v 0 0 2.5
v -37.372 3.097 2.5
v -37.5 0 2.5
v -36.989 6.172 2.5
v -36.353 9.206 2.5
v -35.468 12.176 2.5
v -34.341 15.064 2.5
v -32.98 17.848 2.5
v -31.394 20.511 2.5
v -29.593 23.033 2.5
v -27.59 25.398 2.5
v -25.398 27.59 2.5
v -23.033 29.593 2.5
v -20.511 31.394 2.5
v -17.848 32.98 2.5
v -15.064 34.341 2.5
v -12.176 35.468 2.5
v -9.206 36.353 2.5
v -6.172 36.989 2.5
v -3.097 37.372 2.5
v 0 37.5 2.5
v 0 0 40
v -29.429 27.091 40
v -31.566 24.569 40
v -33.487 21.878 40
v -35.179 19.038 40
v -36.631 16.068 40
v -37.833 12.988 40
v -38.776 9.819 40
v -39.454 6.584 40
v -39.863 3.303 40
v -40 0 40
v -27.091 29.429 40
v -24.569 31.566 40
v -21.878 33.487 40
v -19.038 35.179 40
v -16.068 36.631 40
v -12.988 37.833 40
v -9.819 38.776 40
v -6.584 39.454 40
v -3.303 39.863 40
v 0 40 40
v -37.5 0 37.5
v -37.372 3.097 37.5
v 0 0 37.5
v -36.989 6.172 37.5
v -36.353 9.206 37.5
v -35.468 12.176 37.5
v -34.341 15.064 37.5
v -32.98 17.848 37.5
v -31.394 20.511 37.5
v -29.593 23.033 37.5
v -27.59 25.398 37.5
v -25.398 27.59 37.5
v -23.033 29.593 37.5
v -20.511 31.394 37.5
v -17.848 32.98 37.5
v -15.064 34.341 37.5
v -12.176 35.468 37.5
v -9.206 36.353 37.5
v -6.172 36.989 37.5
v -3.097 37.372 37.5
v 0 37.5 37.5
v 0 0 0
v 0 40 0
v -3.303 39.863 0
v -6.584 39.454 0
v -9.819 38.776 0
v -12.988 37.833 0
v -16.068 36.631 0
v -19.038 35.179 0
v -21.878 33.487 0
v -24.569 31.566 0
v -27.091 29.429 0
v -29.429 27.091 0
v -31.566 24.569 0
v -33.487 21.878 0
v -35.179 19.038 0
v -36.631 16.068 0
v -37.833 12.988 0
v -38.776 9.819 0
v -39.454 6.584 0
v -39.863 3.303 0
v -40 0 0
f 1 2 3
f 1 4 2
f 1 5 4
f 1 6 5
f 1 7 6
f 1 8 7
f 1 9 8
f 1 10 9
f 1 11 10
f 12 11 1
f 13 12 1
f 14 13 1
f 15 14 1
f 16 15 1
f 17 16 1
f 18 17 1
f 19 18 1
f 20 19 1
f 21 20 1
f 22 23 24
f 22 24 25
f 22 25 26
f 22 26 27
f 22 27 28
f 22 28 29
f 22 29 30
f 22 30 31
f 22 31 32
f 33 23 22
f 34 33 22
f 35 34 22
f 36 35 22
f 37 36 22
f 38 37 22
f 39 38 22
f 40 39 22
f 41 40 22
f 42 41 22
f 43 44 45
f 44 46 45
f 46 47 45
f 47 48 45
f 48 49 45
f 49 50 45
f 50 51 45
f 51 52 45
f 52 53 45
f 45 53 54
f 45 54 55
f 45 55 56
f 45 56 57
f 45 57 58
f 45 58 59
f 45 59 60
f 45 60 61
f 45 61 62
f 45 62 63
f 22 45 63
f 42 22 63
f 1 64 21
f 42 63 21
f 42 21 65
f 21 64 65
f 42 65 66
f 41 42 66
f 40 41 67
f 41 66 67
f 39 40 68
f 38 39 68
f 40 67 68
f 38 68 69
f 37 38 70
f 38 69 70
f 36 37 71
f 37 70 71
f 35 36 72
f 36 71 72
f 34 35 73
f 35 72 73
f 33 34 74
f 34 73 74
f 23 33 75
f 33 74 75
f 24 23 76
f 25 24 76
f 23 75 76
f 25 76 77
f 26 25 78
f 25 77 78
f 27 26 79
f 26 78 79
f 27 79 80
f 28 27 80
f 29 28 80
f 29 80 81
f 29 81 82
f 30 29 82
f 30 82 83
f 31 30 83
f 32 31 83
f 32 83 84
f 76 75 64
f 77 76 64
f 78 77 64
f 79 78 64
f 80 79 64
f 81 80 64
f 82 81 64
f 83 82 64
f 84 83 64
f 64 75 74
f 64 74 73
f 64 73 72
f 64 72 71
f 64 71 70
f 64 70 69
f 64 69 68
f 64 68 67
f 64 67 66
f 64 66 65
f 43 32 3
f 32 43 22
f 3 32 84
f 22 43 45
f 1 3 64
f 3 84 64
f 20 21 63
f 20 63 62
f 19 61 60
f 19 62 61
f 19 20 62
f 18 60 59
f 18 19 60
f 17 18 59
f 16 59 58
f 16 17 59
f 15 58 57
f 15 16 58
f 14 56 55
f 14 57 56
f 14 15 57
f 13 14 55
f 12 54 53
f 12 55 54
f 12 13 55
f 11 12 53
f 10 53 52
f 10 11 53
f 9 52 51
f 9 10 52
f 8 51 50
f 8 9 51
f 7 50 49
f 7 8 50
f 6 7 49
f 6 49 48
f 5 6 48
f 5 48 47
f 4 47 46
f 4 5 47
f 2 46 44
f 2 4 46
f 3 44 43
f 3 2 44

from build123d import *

# Parameters (mm, degrees)
F1_DEPTH = 40
F2_T     = -2.5


with BuildPart() as f1:
    # F0 (on Top) → F1 (new body)
    with BuildSketch(Plane.XY):
        with BuildLine():
            Line((-40, 0), (0, 0))
            Line((0, 0), (0, 40))
            ThreePointArc((0, 40), (-28.284271, 28.284271), (-40, 0))
        make_face()
    extrude(amount=F1_DEPTH)

    # F2
    f2_openings = [f1.faces().sort_by_distance(p)[0] for p in [
        (-20, 0, 20),
        (0, 20, 20),
    ]]
    offset(amount=F2_T, openings=f2_openings)


solid = f1.part
